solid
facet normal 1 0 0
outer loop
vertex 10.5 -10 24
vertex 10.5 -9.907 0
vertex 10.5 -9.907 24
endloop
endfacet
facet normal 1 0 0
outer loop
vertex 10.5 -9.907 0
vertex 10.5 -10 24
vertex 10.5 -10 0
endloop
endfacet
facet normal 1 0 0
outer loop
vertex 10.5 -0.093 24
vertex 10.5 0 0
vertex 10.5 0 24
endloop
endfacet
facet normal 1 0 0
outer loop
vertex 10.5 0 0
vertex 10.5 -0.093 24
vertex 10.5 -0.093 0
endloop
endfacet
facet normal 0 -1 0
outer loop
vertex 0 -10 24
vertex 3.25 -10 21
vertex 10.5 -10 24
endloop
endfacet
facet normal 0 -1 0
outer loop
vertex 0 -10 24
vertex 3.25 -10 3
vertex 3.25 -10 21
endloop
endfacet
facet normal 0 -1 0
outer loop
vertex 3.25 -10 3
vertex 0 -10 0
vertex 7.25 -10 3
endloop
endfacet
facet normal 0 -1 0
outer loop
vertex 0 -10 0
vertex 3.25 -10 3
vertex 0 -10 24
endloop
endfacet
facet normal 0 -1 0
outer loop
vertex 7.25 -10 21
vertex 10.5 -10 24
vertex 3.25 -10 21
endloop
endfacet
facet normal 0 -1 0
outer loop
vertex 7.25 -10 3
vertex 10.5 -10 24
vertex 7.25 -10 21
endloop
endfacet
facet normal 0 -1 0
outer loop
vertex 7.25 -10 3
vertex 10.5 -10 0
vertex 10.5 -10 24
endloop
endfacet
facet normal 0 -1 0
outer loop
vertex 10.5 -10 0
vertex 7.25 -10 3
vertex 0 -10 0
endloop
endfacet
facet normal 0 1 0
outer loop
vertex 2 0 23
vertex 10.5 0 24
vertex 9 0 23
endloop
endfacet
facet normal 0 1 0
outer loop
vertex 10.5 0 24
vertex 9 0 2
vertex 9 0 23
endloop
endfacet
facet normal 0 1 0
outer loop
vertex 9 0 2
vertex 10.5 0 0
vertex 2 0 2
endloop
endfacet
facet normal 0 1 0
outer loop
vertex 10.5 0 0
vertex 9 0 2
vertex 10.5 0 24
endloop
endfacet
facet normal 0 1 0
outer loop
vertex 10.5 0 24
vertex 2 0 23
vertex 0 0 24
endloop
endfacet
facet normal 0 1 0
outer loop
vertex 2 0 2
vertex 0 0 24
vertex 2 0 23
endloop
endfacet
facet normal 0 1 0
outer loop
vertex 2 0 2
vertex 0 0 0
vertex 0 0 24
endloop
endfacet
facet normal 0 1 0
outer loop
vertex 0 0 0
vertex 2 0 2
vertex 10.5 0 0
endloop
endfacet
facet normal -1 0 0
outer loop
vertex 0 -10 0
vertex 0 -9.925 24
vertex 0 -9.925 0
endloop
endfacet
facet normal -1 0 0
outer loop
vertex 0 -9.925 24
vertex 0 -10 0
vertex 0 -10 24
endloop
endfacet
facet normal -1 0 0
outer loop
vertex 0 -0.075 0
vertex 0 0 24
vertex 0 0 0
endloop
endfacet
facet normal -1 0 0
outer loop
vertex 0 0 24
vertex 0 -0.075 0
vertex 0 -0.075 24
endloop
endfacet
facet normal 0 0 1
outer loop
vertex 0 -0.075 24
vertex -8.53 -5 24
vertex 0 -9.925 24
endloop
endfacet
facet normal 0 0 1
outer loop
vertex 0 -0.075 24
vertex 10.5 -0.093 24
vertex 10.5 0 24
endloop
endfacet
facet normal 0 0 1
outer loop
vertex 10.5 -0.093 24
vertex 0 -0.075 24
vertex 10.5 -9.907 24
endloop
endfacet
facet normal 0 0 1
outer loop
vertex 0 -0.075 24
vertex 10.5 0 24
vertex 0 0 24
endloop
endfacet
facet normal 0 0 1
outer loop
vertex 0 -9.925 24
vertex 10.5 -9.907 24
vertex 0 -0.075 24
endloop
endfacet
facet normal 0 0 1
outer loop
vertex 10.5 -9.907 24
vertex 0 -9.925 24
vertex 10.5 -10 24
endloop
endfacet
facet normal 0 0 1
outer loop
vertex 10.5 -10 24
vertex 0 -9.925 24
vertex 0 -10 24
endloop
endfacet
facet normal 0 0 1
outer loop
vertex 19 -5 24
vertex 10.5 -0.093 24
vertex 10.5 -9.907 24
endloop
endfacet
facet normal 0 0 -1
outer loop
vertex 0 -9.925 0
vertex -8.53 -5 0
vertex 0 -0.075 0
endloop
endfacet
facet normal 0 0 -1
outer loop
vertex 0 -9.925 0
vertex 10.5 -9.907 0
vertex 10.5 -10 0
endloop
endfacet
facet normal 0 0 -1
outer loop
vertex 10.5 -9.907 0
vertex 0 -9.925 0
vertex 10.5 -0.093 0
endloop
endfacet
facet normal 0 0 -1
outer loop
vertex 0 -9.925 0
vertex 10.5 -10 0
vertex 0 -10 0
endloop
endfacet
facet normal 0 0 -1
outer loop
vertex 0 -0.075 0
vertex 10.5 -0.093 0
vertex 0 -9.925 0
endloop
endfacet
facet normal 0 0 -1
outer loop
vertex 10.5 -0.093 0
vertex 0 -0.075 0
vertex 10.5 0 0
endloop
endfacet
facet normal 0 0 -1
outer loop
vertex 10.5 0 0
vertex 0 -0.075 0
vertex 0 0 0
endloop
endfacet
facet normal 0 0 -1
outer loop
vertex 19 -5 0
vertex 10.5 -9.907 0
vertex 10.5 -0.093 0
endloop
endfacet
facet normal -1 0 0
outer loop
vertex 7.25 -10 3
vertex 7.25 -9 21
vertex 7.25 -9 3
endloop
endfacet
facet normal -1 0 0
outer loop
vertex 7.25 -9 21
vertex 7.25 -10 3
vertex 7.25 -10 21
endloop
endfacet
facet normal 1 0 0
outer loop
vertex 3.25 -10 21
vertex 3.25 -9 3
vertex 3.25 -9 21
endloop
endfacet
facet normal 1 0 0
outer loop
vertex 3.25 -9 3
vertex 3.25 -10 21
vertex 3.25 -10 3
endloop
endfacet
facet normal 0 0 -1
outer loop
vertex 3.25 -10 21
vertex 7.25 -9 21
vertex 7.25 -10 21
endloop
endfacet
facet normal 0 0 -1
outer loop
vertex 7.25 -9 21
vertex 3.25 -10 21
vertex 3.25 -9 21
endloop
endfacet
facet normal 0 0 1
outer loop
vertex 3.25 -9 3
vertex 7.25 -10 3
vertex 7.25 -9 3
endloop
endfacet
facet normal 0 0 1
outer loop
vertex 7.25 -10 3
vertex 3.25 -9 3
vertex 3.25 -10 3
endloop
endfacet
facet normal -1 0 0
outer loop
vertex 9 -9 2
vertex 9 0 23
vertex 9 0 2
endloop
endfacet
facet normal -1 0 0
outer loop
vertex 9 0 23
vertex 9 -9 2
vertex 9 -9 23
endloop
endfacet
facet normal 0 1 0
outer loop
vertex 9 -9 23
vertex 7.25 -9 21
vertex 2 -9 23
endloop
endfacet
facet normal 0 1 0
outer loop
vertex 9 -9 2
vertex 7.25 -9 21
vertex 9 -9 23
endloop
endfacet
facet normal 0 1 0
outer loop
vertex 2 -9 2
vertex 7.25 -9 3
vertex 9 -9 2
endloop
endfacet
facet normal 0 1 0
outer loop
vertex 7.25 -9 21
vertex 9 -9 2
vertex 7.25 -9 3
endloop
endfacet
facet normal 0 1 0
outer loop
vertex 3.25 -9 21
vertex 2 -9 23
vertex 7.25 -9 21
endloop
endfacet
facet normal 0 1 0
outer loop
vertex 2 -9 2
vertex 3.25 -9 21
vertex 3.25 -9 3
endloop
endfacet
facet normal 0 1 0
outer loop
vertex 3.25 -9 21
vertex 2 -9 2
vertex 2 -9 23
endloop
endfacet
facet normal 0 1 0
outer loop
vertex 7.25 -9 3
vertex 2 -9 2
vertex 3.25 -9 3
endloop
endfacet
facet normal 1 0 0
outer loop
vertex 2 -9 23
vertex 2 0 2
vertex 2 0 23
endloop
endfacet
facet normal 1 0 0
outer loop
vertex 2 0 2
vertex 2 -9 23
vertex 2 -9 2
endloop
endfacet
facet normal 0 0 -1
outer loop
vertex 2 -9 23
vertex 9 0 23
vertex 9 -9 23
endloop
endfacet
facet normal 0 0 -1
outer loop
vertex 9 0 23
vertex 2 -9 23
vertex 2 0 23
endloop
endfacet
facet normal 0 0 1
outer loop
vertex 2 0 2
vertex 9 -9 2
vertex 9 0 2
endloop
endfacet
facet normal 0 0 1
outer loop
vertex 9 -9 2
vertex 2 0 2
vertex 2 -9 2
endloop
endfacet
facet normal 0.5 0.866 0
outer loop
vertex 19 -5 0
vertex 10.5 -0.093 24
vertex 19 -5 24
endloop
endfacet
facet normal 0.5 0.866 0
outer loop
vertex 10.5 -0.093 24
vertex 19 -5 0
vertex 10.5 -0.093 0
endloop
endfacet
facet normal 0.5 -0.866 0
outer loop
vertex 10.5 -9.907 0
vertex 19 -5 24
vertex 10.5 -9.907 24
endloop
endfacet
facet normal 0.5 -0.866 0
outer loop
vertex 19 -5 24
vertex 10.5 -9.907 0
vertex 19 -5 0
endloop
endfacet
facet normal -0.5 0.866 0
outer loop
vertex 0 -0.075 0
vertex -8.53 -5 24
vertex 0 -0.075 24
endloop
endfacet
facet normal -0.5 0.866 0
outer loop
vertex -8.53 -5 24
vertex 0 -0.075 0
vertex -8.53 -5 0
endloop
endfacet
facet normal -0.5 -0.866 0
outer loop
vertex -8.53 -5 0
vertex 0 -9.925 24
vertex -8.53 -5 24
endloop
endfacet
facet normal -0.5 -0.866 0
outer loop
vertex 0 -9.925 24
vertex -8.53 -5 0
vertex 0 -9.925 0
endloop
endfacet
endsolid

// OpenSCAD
//Guarda del final de carrera

rotate([90,0,0]){ //gira el cuerpo para facilitar impresion

//cuerpo central
difference(){ 
	cube([10.5,24,10]);
	translate([3.25,3,-1])
		cube([4,18,12]); //contactos
	translate([2,2,-1])
		cube([7,21,10]); //cuerpo
}

//triangulos laterales
translate([13.3,0,5])
	rotate([-90,0,0])
		cylinder (r=5.7, h=24,  $fn=3);
translate([-2.83,24,5])
	rotate([90,180,0])
		cylinder (r=5.7, h=24,  $fn=3);

}//gira el cuerpo para facilitar impresion
